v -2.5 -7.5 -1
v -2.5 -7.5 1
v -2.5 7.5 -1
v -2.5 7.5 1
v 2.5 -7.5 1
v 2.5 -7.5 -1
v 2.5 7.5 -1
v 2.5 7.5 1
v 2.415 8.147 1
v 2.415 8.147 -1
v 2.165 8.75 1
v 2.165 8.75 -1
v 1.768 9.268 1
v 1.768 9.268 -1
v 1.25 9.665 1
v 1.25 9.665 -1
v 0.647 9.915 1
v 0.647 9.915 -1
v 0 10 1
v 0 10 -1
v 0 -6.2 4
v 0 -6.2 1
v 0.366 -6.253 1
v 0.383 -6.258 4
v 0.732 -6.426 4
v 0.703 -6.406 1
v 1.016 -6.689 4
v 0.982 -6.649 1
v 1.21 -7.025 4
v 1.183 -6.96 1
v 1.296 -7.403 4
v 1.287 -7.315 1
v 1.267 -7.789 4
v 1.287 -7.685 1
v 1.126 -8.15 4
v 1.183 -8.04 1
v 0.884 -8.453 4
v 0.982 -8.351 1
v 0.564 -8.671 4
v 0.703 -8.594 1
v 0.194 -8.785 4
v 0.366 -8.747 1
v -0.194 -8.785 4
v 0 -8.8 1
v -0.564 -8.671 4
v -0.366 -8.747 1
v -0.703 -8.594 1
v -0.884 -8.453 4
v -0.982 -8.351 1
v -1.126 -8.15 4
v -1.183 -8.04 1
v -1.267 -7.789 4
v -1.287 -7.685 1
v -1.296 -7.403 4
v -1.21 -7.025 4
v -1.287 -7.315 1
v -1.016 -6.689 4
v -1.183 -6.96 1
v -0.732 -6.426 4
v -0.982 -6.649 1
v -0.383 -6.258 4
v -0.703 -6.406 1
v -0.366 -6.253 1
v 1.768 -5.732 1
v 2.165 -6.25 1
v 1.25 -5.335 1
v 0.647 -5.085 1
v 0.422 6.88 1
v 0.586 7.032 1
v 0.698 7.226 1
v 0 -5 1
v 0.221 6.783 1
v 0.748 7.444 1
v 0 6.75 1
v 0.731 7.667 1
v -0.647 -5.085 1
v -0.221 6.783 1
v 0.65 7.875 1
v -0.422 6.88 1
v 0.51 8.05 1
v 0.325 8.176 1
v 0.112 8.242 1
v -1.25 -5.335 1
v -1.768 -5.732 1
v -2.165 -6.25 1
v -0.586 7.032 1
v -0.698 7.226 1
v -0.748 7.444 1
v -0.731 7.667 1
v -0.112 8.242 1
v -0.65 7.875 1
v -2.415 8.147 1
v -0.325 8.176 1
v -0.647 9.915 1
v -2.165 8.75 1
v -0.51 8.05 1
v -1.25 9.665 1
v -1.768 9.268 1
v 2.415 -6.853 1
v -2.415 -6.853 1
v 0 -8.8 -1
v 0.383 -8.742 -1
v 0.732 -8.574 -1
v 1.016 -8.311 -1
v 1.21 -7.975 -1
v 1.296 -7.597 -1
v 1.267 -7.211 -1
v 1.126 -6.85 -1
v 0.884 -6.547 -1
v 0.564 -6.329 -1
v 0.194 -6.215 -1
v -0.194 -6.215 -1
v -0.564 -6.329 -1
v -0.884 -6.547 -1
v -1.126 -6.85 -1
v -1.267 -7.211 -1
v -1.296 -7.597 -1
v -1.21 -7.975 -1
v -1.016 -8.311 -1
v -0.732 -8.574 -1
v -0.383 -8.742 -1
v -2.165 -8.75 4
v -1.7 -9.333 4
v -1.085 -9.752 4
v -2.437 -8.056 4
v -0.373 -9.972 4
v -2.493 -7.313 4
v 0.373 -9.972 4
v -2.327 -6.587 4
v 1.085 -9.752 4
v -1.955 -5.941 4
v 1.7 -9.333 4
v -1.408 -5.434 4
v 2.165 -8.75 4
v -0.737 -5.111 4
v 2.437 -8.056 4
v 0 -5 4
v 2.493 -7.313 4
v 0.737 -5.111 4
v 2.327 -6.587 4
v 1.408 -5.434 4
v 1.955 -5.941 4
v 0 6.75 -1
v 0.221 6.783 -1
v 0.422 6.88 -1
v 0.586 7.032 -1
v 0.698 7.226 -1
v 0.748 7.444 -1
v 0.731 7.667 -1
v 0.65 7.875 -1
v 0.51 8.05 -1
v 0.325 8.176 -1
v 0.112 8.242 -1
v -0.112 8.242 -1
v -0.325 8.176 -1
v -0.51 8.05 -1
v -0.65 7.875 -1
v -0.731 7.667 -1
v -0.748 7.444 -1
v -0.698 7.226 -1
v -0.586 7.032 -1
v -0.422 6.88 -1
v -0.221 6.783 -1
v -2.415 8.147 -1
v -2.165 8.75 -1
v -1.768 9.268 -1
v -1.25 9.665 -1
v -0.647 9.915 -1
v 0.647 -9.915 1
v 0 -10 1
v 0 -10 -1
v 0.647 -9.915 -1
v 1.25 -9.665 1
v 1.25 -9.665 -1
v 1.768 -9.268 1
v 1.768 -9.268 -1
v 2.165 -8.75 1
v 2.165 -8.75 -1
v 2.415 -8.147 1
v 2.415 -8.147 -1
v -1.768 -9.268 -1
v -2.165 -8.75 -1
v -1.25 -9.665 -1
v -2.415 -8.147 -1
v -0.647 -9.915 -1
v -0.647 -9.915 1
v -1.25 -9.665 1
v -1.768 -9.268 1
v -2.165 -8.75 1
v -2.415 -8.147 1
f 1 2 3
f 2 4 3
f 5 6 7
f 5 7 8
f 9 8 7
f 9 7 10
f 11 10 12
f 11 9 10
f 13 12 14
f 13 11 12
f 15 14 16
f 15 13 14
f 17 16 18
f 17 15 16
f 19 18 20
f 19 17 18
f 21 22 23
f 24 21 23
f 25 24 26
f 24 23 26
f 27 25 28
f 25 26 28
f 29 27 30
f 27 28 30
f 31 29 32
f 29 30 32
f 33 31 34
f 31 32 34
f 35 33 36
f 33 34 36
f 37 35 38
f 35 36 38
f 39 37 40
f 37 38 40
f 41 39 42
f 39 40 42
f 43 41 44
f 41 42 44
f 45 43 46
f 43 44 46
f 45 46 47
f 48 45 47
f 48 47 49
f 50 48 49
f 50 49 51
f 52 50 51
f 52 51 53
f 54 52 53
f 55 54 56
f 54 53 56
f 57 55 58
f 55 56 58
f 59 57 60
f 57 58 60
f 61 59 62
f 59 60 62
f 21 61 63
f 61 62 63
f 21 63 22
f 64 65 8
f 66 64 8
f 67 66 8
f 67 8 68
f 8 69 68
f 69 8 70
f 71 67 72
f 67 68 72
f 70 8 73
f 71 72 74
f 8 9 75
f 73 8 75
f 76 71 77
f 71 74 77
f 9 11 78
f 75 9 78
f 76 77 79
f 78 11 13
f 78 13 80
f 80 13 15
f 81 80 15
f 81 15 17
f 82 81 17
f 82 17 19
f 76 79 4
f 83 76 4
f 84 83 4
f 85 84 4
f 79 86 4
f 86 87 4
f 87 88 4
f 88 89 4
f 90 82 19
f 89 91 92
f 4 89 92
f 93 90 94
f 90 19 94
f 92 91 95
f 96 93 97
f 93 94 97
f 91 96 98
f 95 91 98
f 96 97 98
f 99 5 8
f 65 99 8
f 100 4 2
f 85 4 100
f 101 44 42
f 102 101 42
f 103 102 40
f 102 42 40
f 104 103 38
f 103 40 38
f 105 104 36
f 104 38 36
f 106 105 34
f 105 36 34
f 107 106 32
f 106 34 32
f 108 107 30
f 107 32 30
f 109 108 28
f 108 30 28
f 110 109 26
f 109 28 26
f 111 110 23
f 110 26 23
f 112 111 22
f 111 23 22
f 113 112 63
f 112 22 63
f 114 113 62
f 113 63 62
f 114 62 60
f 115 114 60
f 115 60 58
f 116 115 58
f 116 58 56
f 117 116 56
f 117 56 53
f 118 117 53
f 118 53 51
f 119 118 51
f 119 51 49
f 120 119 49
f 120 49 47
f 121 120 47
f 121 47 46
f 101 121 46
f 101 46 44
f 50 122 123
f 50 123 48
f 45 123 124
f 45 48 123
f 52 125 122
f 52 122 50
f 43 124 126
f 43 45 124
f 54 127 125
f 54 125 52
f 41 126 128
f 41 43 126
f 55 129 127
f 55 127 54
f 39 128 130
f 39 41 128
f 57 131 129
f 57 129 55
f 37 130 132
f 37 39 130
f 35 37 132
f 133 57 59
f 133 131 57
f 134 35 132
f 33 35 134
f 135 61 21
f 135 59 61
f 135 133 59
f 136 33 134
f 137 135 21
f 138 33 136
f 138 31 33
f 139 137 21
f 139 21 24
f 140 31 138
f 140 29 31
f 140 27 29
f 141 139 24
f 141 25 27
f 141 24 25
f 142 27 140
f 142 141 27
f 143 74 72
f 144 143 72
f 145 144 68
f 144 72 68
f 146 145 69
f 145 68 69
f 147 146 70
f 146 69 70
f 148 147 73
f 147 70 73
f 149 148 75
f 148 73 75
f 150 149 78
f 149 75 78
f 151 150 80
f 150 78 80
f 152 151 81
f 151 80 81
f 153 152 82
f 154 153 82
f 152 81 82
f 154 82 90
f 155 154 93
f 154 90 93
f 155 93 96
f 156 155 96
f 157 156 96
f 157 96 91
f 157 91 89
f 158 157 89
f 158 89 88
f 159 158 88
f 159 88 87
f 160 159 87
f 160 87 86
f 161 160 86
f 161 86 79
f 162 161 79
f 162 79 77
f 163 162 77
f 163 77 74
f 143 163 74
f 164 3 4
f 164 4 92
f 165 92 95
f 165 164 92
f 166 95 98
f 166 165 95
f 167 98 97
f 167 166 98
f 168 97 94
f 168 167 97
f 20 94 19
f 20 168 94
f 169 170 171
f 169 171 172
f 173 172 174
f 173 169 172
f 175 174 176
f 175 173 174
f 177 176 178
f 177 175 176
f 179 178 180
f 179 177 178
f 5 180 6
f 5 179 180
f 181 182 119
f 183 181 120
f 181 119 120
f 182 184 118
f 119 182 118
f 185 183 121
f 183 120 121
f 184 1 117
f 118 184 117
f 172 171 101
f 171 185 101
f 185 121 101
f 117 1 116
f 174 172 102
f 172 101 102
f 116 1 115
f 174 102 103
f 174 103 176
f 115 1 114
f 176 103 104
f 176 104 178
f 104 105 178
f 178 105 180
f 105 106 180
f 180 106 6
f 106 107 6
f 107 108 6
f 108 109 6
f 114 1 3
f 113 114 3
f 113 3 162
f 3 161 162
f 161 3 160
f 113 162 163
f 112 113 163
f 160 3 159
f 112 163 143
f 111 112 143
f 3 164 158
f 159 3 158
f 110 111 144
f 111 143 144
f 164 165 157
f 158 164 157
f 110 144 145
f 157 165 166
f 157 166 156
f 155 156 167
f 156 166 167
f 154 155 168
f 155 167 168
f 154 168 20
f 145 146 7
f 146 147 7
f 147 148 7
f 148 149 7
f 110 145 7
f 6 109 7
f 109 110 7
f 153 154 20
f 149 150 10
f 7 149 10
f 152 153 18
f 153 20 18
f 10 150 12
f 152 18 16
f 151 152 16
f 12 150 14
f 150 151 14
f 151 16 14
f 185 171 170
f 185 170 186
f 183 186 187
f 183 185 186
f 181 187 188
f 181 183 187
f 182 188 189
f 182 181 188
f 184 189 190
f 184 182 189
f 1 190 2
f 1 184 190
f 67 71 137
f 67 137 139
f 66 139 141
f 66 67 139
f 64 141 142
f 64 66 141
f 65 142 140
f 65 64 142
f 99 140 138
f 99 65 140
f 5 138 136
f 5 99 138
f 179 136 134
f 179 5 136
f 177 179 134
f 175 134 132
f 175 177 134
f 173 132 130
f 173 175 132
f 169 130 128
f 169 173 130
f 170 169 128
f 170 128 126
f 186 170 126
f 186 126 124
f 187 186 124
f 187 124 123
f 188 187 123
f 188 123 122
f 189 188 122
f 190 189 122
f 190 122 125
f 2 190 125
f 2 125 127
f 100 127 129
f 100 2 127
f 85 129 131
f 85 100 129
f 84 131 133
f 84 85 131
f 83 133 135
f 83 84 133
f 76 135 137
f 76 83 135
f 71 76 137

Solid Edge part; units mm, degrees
sketch "Sketch1" plane through (0, 0, 0) normal (0, -1, 0) x (1, 0, 0)
  line L0 (-2.5, -1) -> (2.5, -1)
  line L1 (2.5, -1) -> (2.5, 1)
  line L2 (2.5, 1) -> (-2.5, 1)
  line L3 (-2.5, 1) -> (-2.5, -1)
extrude "Protrusion1" add sketch "Sketch1" along normal mid plane 20
fillet "Round_2" radius 2.5 4 edges at (-2.5, -10, 0) (2.5, -10, 0) (2.5, 10, 0) (-2.5, 10, 0)
hole "Hole_2" at (0, -7.5, 1) direction (0, 0, -1) diameter 2.6 end through all
hole "Hole_4" at (0, 7.5, 1) direction (0, 0, -1) diameter 1.5 end through all
sketch "Sketch2" plane through (0, 0, 1) normal (0, 0, 1) x (0, 1, 0)
  circle A0 centre (-7.5, 0) radius 2.5
  circle A1 centre (-7.5, 0) radius 1.3
extrude "ExtrudedProtrusion_2" add sketch "Sketch2" along normal blind 3
properties material "ABS Plastic, high impact"
